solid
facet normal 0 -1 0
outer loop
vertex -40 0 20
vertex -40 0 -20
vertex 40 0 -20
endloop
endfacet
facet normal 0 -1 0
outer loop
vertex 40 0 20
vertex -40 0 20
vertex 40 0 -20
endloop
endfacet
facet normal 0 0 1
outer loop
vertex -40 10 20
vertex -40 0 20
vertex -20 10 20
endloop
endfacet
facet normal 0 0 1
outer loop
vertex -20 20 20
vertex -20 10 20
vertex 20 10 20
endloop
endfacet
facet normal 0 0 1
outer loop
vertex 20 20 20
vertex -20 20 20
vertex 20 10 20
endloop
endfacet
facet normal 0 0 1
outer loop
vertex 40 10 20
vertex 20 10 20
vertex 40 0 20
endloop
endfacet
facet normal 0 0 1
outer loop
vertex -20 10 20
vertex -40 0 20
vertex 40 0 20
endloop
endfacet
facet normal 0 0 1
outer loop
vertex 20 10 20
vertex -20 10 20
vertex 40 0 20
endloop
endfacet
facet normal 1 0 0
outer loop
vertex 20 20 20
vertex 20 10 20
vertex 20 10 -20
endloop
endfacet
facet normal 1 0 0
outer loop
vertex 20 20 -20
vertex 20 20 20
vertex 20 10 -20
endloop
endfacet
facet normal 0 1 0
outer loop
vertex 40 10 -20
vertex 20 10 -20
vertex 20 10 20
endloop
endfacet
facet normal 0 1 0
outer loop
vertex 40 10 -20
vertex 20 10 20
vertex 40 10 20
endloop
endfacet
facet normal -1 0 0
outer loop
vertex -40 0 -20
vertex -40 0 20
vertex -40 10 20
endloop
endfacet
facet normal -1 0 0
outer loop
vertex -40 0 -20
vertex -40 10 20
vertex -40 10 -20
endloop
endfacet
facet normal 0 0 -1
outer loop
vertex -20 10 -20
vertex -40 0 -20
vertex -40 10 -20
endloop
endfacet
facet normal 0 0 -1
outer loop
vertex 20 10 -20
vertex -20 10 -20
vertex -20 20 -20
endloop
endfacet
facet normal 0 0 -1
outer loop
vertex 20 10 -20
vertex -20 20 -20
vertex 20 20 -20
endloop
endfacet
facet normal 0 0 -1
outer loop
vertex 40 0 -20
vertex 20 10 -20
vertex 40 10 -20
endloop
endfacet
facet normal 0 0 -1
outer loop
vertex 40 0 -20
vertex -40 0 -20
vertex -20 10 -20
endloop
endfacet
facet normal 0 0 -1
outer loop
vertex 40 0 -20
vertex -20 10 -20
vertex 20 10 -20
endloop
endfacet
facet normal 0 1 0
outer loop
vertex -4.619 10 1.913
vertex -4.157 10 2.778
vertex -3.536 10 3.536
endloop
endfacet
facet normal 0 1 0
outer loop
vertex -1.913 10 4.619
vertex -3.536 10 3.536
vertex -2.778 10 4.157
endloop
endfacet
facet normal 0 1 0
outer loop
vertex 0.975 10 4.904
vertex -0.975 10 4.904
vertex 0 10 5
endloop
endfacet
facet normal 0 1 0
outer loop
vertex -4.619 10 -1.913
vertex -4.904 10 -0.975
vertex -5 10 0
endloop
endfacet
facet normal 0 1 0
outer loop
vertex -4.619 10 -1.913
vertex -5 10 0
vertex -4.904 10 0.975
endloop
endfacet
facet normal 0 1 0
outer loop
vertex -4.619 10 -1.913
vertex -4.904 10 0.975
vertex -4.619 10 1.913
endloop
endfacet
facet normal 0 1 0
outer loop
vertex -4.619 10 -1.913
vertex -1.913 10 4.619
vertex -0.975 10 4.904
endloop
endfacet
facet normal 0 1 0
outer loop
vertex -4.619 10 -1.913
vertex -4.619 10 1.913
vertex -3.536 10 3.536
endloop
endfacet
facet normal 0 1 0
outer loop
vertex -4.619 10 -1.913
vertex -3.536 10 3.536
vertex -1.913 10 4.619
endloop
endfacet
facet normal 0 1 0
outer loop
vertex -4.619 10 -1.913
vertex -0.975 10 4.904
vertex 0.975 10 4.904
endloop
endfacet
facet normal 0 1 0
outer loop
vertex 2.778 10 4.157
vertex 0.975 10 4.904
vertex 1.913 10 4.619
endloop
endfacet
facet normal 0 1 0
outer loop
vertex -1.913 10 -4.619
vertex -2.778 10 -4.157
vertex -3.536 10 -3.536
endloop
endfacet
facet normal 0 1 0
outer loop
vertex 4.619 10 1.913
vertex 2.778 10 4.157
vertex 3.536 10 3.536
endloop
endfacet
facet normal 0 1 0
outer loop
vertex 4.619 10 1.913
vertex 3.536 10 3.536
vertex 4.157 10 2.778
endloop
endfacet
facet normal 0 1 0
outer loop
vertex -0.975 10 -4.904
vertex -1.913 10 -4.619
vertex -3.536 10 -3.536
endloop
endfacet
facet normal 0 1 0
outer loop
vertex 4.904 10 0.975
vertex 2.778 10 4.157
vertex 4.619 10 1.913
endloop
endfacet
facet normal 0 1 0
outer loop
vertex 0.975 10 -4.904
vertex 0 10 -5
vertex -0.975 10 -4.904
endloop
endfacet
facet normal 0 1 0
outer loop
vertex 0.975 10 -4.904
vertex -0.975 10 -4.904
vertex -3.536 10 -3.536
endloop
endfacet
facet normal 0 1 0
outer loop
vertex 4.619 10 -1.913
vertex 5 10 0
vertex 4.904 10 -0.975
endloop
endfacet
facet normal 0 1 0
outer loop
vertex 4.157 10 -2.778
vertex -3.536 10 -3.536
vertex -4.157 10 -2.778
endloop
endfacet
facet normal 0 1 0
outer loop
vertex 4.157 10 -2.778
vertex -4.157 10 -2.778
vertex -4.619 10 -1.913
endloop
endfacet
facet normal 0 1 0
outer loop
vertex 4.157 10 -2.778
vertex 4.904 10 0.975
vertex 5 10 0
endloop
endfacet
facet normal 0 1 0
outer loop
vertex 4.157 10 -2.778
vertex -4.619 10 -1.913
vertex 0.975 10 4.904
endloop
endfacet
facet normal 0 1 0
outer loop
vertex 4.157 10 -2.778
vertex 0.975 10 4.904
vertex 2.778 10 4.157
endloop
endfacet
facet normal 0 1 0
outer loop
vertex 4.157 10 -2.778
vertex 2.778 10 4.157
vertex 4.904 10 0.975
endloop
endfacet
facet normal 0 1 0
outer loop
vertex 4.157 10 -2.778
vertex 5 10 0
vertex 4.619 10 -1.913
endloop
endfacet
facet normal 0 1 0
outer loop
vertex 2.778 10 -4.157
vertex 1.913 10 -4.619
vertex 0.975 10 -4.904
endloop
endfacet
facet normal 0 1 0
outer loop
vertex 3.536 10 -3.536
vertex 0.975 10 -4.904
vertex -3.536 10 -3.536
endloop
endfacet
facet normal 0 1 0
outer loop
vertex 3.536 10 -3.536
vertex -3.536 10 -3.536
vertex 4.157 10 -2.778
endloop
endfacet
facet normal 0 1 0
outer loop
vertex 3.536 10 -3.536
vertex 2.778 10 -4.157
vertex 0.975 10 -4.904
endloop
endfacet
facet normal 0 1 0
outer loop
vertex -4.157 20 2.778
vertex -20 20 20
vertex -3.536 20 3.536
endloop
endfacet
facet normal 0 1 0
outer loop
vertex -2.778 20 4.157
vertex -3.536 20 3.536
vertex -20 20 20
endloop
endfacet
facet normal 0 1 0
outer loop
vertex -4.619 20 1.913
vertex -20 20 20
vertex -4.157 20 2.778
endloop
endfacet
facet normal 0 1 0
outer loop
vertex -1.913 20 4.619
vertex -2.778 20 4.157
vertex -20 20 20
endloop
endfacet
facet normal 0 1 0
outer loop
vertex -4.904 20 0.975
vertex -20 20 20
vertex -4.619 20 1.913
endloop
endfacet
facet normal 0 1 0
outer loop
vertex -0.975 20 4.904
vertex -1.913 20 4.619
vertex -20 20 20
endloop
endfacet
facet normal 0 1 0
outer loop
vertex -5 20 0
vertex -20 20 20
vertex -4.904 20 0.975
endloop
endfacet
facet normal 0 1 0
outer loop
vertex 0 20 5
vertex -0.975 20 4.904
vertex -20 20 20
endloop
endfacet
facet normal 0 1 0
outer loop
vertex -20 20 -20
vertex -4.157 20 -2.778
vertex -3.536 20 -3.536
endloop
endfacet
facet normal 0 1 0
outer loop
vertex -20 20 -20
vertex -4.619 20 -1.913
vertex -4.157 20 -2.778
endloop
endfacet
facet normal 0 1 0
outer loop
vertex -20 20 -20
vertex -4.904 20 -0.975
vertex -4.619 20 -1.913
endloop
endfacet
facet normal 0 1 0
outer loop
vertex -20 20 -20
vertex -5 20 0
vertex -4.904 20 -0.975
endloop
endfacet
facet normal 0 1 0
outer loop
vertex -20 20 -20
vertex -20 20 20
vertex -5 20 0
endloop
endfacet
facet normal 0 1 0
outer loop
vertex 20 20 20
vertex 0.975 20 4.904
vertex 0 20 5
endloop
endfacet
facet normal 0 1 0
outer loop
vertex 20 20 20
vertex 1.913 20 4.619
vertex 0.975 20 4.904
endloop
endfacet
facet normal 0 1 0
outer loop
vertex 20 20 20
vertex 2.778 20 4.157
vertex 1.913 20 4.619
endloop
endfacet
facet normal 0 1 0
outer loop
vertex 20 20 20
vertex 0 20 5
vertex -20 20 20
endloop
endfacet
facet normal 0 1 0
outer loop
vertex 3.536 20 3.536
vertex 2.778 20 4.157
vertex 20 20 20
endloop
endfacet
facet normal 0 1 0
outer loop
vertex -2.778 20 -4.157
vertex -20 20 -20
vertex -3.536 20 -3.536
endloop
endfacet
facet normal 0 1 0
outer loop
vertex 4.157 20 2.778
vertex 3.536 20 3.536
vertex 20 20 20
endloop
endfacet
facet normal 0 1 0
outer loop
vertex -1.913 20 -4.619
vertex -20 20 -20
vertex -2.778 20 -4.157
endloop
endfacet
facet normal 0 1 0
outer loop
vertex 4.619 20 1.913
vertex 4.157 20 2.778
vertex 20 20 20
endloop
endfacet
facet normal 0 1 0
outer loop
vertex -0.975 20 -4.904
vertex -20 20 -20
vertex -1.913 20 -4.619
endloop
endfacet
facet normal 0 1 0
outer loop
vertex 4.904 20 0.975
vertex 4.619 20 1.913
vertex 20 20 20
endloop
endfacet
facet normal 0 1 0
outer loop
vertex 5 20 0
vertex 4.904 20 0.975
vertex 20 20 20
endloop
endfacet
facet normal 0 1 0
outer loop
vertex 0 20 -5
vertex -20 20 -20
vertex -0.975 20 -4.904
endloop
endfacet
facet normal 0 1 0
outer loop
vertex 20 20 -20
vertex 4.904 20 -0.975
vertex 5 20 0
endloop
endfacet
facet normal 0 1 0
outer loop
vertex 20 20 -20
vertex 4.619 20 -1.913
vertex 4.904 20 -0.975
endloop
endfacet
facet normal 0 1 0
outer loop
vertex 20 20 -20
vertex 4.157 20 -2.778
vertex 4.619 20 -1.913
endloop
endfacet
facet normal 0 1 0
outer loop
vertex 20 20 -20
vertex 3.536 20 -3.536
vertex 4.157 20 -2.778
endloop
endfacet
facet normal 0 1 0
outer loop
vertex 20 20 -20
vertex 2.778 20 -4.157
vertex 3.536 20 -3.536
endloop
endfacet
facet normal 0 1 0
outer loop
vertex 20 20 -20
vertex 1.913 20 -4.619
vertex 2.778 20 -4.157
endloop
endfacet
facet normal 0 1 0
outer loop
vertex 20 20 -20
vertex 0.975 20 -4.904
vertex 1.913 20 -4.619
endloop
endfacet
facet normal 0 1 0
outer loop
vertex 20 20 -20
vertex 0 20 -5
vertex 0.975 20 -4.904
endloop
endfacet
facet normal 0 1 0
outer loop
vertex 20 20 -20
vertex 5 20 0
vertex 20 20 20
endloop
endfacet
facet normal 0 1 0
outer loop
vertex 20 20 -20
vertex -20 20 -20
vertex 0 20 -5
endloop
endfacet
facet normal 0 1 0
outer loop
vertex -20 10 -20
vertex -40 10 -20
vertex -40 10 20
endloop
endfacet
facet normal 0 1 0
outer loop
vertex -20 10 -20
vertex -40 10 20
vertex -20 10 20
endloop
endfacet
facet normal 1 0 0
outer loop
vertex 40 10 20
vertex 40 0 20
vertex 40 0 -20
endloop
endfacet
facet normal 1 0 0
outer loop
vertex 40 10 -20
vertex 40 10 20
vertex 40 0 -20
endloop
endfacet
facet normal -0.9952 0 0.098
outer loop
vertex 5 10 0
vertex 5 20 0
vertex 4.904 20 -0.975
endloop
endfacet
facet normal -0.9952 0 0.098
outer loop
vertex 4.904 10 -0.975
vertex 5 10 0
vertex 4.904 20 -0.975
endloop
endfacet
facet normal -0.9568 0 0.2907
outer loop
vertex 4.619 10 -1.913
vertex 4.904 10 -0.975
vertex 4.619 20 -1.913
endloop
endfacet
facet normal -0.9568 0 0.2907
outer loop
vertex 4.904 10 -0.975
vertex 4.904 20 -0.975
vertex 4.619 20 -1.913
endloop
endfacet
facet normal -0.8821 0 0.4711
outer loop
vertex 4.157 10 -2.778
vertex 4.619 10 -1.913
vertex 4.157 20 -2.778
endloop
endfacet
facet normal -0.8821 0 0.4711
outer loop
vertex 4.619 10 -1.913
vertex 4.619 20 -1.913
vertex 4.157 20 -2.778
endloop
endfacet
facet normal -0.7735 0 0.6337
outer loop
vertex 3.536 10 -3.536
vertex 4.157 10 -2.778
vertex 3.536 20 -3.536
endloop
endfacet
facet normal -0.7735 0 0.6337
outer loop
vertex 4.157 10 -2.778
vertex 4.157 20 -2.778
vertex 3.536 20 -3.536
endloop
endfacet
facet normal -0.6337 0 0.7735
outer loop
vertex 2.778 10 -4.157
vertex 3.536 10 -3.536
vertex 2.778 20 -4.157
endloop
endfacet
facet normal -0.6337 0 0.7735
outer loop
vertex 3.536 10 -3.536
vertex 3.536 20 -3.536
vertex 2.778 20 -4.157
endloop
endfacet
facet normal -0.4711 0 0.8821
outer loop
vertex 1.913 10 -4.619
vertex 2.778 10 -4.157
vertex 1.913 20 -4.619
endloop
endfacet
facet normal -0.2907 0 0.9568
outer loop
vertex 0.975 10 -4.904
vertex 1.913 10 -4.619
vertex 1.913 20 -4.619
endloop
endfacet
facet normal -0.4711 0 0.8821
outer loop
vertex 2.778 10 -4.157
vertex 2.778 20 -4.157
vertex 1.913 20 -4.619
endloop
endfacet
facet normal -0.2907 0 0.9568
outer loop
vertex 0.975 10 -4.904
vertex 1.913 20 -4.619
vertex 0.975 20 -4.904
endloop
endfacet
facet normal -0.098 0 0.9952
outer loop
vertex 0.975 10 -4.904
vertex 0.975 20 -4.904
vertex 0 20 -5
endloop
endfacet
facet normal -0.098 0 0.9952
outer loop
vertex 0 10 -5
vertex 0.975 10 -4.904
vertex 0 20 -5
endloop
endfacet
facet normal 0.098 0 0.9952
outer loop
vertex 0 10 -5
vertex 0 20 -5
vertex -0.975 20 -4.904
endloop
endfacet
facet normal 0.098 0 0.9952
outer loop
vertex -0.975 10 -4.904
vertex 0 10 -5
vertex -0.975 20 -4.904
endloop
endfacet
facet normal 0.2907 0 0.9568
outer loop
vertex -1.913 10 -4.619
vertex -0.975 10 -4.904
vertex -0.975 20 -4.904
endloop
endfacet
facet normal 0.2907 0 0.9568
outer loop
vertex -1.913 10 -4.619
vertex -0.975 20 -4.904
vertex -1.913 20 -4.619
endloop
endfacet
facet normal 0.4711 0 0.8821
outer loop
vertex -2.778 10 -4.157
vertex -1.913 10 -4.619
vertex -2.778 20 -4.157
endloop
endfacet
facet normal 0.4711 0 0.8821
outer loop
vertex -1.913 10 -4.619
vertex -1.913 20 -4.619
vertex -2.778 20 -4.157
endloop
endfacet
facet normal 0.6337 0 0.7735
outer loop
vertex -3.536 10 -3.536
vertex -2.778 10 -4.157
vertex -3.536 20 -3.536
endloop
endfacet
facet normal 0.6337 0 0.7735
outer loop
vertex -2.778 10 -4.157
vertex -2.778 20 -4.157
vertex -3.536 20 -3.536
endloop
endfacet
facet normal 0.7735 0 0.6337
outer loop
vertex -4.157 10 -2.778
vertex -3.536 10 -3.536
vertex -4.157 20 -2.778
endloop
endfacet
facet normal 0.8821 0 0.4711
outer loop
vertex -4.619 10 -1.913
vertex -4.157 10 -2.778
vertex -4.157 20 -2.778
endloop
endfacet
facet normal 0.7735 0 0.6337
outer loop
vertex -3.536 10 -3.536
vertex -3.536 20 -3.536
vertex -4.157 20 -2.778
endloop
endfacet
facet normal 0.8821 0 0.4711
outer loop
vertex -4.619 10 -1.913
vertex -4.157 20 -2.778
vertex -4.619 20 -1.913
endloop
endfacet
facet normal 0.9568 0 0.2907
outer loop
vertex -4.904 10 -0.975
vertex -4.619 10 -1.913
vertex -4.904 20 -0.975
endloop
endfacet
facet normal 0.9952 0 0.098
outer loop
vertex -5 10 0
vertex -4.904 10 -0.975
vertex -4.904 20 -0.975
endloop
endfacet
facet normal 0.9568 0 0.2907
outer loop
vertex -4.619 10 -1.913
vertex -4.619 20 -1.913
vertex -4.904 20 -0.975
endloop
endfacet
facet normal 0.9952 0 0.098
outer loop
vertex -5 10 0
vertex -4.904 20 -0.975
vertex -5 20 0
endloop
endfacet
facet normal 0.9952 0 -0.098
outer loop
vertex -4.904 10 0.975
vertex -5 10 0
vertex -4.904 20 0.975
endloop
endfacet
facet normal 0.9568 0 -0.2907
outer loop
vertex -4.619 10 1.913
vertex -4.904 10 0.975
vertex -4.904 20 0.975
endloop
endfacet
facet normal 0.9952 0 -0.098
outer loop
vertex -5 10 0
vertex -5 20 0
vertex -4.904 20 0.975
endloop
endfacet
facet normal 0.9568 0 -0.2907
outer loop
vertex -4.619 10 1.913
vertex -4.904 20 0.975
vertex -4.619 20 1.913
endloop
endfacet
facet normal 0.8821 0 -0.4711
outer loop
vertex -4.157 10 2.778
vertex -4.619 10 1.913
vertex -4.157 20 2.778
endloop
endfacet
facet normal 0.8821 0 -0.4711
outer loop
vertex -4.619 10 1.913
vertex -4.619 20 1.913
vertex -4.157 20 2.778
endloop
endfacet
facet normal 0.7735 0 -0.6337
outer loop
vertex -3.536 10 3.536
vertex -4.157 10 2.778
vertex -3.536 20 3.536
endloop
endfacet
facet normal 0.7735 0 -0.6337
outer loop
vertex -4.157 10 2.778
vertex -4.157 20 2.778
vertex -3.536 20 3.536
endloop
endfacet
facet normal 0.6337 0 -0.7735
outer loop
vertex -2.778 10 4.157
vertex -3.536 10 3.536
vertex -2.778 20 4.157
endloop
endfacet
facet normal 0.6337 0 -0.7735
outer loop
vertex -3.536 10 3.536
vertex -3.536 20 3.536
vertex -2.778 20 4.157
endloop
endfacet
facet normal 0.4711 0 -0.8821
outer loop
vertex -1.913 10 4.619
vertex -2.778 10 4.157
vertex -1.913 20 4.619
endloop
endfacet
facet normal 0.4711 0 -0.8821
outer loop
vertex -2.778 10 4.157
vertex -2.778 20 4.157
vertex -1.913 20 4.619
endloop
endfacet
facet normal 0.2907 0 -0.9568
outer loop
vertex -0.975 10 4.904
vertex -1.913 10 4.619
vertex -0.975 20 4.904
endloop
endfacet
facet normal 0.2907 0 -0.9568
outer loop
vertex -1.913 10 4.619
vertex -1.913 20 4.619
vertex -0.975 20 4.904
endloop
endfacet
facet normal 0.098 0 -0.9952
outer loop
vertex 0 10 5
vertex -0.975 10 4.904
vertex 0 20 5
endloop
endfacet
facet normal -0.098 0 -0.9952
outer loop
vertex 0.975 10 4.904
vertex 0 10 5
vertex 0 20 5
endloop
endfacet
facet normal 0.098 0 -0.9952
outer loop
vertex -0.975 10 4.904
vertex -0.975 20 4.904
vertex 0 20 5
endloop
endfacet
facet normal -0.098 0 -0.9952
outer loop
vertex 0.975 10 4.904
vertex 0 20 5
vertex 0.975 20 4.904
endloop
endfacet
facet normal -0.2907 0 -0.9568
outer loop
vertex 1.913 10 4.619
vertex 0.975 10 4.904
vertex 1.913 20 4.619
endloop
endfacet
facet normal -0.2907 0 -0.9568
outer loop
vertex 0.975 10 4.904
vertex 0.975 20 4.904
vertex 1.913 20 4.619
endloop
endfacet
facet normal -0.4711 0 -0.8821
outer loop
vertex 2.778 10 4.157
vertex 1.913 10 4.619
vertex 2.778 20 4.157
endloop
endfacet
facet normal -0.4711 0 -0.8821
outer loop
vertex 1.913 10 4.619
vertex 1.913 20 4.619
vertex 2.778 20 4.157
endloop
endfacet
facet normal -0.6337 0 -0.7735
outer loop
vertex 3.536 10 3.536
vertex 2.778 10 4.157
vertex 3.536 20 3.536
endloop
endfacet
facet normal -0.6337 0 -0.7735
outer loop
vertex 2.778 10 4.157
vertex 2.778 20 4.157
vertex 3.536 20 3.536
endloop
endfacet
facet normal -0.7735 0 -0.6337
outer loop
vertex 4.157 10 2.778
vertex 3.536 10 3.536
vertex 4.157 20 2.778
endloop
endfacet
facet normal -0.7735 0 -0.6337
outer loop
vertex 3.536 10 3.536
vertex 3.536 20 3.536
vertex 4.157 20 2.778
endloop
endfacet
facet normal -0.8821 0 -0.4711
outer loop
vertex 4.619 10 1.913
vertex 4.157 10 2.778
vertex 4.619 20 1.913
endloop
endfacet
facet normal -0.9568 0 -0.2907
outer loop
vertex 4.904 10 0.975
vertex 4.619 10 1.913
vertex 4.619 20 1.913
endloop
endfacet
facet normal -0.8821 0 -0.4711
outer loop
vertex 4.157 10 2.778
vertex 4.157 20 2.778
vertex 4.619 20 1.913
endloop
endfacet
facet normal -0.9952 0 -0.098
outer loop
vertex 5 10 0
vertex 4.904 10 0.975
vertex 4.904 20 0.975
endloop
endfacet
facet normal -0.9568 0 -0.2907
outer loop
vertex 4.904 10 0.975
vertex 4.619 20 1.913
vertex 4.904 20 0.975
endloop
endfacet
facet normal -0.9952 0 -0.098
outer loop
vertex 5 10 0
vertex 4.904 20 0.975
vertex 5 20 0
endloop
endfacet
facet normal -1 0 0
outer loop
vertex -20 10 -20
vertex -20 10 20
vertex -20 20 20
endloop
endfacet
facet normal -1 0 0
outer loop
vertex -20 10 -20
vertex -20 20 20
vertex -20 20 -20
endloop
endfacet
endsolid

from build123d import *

# Parameters (mm, degrees)
SKETCH1_W           = 80
SKETCH1_H           = 40
BOSS_EXTRUDE1_DEPTH = 10
SKETCH2_W           = 40
SKETCH2_H           = 40
BOSS_EXTRUDE2_DEPTH = 10
SKETCH3_R           = 5
CUT_EXTRUDE1_DEPTH  = 10
SKETCH4_R           = 5
BOSS_EXTRUDE3_DEPTH = 10
SKETCH5_R           = 5
CUT_EXTRUDE2_DEPTH  = 10


with BuildPart() as part:
    # Sketch1 → Boss-Extrude1 (new body)
    with BuildSketch(Plane(origin=(0, 0, 0), x_dir=(1, 0, 0), z_dir=(0, 1, 0))):
        Rectangle(SKETCH1_W, SKETCH1_H)
    extrude(amount=BOSS_EXTRUDE1_DEPTH)

    # Sketch2 → Boss-Extrude2 (add)
    with BuildSketch(Plane(origin=(0, 10, 0), x_dir=(1, 0, 0), z_dir=(0, 1, 0))):
        Rectangle(SKETCH2_W, SKETCH2_H)
    extrude(amount=BOSS_EXTRUDE2_DEPTH)

    # Sketch3 → Cut-Extrude1 (cut)
    with BuildSketch(Plane(origin=(0, 20, 0), x_dir=(1, 0, 0), z_dir=(0, 1, 0))):
        Circle(SKETCH3_R)
    extrude(amount=-CUT_EXTRUDE1_DEPTH, mode=Mode.SUBTRACT)

    # Sketch4 → Boss-Extrude3 (add)
    with BuildSketch(Plane(origin=(0, 10, 0), x_dir=(1, 0, 0), z_dir=(0, 1, 0))):
        Circle(SKETCH4_R)
    extrude(amount=BOSS_EXTRUDE3_DEPTH)

    # Sketch5 → Cut-Extrude2 (cut)
    with BuildSketch(Plane(origin=(0, 20, 0), x_dir=(1, 0, 0), z_dir=(0, 1, 0))):
        Circle(SKETCH5_R)
    extrude(amount=-CUT_EXTRUDE2_DEPTH, mode=Mode.SUBTRACT)


solid = part.part
